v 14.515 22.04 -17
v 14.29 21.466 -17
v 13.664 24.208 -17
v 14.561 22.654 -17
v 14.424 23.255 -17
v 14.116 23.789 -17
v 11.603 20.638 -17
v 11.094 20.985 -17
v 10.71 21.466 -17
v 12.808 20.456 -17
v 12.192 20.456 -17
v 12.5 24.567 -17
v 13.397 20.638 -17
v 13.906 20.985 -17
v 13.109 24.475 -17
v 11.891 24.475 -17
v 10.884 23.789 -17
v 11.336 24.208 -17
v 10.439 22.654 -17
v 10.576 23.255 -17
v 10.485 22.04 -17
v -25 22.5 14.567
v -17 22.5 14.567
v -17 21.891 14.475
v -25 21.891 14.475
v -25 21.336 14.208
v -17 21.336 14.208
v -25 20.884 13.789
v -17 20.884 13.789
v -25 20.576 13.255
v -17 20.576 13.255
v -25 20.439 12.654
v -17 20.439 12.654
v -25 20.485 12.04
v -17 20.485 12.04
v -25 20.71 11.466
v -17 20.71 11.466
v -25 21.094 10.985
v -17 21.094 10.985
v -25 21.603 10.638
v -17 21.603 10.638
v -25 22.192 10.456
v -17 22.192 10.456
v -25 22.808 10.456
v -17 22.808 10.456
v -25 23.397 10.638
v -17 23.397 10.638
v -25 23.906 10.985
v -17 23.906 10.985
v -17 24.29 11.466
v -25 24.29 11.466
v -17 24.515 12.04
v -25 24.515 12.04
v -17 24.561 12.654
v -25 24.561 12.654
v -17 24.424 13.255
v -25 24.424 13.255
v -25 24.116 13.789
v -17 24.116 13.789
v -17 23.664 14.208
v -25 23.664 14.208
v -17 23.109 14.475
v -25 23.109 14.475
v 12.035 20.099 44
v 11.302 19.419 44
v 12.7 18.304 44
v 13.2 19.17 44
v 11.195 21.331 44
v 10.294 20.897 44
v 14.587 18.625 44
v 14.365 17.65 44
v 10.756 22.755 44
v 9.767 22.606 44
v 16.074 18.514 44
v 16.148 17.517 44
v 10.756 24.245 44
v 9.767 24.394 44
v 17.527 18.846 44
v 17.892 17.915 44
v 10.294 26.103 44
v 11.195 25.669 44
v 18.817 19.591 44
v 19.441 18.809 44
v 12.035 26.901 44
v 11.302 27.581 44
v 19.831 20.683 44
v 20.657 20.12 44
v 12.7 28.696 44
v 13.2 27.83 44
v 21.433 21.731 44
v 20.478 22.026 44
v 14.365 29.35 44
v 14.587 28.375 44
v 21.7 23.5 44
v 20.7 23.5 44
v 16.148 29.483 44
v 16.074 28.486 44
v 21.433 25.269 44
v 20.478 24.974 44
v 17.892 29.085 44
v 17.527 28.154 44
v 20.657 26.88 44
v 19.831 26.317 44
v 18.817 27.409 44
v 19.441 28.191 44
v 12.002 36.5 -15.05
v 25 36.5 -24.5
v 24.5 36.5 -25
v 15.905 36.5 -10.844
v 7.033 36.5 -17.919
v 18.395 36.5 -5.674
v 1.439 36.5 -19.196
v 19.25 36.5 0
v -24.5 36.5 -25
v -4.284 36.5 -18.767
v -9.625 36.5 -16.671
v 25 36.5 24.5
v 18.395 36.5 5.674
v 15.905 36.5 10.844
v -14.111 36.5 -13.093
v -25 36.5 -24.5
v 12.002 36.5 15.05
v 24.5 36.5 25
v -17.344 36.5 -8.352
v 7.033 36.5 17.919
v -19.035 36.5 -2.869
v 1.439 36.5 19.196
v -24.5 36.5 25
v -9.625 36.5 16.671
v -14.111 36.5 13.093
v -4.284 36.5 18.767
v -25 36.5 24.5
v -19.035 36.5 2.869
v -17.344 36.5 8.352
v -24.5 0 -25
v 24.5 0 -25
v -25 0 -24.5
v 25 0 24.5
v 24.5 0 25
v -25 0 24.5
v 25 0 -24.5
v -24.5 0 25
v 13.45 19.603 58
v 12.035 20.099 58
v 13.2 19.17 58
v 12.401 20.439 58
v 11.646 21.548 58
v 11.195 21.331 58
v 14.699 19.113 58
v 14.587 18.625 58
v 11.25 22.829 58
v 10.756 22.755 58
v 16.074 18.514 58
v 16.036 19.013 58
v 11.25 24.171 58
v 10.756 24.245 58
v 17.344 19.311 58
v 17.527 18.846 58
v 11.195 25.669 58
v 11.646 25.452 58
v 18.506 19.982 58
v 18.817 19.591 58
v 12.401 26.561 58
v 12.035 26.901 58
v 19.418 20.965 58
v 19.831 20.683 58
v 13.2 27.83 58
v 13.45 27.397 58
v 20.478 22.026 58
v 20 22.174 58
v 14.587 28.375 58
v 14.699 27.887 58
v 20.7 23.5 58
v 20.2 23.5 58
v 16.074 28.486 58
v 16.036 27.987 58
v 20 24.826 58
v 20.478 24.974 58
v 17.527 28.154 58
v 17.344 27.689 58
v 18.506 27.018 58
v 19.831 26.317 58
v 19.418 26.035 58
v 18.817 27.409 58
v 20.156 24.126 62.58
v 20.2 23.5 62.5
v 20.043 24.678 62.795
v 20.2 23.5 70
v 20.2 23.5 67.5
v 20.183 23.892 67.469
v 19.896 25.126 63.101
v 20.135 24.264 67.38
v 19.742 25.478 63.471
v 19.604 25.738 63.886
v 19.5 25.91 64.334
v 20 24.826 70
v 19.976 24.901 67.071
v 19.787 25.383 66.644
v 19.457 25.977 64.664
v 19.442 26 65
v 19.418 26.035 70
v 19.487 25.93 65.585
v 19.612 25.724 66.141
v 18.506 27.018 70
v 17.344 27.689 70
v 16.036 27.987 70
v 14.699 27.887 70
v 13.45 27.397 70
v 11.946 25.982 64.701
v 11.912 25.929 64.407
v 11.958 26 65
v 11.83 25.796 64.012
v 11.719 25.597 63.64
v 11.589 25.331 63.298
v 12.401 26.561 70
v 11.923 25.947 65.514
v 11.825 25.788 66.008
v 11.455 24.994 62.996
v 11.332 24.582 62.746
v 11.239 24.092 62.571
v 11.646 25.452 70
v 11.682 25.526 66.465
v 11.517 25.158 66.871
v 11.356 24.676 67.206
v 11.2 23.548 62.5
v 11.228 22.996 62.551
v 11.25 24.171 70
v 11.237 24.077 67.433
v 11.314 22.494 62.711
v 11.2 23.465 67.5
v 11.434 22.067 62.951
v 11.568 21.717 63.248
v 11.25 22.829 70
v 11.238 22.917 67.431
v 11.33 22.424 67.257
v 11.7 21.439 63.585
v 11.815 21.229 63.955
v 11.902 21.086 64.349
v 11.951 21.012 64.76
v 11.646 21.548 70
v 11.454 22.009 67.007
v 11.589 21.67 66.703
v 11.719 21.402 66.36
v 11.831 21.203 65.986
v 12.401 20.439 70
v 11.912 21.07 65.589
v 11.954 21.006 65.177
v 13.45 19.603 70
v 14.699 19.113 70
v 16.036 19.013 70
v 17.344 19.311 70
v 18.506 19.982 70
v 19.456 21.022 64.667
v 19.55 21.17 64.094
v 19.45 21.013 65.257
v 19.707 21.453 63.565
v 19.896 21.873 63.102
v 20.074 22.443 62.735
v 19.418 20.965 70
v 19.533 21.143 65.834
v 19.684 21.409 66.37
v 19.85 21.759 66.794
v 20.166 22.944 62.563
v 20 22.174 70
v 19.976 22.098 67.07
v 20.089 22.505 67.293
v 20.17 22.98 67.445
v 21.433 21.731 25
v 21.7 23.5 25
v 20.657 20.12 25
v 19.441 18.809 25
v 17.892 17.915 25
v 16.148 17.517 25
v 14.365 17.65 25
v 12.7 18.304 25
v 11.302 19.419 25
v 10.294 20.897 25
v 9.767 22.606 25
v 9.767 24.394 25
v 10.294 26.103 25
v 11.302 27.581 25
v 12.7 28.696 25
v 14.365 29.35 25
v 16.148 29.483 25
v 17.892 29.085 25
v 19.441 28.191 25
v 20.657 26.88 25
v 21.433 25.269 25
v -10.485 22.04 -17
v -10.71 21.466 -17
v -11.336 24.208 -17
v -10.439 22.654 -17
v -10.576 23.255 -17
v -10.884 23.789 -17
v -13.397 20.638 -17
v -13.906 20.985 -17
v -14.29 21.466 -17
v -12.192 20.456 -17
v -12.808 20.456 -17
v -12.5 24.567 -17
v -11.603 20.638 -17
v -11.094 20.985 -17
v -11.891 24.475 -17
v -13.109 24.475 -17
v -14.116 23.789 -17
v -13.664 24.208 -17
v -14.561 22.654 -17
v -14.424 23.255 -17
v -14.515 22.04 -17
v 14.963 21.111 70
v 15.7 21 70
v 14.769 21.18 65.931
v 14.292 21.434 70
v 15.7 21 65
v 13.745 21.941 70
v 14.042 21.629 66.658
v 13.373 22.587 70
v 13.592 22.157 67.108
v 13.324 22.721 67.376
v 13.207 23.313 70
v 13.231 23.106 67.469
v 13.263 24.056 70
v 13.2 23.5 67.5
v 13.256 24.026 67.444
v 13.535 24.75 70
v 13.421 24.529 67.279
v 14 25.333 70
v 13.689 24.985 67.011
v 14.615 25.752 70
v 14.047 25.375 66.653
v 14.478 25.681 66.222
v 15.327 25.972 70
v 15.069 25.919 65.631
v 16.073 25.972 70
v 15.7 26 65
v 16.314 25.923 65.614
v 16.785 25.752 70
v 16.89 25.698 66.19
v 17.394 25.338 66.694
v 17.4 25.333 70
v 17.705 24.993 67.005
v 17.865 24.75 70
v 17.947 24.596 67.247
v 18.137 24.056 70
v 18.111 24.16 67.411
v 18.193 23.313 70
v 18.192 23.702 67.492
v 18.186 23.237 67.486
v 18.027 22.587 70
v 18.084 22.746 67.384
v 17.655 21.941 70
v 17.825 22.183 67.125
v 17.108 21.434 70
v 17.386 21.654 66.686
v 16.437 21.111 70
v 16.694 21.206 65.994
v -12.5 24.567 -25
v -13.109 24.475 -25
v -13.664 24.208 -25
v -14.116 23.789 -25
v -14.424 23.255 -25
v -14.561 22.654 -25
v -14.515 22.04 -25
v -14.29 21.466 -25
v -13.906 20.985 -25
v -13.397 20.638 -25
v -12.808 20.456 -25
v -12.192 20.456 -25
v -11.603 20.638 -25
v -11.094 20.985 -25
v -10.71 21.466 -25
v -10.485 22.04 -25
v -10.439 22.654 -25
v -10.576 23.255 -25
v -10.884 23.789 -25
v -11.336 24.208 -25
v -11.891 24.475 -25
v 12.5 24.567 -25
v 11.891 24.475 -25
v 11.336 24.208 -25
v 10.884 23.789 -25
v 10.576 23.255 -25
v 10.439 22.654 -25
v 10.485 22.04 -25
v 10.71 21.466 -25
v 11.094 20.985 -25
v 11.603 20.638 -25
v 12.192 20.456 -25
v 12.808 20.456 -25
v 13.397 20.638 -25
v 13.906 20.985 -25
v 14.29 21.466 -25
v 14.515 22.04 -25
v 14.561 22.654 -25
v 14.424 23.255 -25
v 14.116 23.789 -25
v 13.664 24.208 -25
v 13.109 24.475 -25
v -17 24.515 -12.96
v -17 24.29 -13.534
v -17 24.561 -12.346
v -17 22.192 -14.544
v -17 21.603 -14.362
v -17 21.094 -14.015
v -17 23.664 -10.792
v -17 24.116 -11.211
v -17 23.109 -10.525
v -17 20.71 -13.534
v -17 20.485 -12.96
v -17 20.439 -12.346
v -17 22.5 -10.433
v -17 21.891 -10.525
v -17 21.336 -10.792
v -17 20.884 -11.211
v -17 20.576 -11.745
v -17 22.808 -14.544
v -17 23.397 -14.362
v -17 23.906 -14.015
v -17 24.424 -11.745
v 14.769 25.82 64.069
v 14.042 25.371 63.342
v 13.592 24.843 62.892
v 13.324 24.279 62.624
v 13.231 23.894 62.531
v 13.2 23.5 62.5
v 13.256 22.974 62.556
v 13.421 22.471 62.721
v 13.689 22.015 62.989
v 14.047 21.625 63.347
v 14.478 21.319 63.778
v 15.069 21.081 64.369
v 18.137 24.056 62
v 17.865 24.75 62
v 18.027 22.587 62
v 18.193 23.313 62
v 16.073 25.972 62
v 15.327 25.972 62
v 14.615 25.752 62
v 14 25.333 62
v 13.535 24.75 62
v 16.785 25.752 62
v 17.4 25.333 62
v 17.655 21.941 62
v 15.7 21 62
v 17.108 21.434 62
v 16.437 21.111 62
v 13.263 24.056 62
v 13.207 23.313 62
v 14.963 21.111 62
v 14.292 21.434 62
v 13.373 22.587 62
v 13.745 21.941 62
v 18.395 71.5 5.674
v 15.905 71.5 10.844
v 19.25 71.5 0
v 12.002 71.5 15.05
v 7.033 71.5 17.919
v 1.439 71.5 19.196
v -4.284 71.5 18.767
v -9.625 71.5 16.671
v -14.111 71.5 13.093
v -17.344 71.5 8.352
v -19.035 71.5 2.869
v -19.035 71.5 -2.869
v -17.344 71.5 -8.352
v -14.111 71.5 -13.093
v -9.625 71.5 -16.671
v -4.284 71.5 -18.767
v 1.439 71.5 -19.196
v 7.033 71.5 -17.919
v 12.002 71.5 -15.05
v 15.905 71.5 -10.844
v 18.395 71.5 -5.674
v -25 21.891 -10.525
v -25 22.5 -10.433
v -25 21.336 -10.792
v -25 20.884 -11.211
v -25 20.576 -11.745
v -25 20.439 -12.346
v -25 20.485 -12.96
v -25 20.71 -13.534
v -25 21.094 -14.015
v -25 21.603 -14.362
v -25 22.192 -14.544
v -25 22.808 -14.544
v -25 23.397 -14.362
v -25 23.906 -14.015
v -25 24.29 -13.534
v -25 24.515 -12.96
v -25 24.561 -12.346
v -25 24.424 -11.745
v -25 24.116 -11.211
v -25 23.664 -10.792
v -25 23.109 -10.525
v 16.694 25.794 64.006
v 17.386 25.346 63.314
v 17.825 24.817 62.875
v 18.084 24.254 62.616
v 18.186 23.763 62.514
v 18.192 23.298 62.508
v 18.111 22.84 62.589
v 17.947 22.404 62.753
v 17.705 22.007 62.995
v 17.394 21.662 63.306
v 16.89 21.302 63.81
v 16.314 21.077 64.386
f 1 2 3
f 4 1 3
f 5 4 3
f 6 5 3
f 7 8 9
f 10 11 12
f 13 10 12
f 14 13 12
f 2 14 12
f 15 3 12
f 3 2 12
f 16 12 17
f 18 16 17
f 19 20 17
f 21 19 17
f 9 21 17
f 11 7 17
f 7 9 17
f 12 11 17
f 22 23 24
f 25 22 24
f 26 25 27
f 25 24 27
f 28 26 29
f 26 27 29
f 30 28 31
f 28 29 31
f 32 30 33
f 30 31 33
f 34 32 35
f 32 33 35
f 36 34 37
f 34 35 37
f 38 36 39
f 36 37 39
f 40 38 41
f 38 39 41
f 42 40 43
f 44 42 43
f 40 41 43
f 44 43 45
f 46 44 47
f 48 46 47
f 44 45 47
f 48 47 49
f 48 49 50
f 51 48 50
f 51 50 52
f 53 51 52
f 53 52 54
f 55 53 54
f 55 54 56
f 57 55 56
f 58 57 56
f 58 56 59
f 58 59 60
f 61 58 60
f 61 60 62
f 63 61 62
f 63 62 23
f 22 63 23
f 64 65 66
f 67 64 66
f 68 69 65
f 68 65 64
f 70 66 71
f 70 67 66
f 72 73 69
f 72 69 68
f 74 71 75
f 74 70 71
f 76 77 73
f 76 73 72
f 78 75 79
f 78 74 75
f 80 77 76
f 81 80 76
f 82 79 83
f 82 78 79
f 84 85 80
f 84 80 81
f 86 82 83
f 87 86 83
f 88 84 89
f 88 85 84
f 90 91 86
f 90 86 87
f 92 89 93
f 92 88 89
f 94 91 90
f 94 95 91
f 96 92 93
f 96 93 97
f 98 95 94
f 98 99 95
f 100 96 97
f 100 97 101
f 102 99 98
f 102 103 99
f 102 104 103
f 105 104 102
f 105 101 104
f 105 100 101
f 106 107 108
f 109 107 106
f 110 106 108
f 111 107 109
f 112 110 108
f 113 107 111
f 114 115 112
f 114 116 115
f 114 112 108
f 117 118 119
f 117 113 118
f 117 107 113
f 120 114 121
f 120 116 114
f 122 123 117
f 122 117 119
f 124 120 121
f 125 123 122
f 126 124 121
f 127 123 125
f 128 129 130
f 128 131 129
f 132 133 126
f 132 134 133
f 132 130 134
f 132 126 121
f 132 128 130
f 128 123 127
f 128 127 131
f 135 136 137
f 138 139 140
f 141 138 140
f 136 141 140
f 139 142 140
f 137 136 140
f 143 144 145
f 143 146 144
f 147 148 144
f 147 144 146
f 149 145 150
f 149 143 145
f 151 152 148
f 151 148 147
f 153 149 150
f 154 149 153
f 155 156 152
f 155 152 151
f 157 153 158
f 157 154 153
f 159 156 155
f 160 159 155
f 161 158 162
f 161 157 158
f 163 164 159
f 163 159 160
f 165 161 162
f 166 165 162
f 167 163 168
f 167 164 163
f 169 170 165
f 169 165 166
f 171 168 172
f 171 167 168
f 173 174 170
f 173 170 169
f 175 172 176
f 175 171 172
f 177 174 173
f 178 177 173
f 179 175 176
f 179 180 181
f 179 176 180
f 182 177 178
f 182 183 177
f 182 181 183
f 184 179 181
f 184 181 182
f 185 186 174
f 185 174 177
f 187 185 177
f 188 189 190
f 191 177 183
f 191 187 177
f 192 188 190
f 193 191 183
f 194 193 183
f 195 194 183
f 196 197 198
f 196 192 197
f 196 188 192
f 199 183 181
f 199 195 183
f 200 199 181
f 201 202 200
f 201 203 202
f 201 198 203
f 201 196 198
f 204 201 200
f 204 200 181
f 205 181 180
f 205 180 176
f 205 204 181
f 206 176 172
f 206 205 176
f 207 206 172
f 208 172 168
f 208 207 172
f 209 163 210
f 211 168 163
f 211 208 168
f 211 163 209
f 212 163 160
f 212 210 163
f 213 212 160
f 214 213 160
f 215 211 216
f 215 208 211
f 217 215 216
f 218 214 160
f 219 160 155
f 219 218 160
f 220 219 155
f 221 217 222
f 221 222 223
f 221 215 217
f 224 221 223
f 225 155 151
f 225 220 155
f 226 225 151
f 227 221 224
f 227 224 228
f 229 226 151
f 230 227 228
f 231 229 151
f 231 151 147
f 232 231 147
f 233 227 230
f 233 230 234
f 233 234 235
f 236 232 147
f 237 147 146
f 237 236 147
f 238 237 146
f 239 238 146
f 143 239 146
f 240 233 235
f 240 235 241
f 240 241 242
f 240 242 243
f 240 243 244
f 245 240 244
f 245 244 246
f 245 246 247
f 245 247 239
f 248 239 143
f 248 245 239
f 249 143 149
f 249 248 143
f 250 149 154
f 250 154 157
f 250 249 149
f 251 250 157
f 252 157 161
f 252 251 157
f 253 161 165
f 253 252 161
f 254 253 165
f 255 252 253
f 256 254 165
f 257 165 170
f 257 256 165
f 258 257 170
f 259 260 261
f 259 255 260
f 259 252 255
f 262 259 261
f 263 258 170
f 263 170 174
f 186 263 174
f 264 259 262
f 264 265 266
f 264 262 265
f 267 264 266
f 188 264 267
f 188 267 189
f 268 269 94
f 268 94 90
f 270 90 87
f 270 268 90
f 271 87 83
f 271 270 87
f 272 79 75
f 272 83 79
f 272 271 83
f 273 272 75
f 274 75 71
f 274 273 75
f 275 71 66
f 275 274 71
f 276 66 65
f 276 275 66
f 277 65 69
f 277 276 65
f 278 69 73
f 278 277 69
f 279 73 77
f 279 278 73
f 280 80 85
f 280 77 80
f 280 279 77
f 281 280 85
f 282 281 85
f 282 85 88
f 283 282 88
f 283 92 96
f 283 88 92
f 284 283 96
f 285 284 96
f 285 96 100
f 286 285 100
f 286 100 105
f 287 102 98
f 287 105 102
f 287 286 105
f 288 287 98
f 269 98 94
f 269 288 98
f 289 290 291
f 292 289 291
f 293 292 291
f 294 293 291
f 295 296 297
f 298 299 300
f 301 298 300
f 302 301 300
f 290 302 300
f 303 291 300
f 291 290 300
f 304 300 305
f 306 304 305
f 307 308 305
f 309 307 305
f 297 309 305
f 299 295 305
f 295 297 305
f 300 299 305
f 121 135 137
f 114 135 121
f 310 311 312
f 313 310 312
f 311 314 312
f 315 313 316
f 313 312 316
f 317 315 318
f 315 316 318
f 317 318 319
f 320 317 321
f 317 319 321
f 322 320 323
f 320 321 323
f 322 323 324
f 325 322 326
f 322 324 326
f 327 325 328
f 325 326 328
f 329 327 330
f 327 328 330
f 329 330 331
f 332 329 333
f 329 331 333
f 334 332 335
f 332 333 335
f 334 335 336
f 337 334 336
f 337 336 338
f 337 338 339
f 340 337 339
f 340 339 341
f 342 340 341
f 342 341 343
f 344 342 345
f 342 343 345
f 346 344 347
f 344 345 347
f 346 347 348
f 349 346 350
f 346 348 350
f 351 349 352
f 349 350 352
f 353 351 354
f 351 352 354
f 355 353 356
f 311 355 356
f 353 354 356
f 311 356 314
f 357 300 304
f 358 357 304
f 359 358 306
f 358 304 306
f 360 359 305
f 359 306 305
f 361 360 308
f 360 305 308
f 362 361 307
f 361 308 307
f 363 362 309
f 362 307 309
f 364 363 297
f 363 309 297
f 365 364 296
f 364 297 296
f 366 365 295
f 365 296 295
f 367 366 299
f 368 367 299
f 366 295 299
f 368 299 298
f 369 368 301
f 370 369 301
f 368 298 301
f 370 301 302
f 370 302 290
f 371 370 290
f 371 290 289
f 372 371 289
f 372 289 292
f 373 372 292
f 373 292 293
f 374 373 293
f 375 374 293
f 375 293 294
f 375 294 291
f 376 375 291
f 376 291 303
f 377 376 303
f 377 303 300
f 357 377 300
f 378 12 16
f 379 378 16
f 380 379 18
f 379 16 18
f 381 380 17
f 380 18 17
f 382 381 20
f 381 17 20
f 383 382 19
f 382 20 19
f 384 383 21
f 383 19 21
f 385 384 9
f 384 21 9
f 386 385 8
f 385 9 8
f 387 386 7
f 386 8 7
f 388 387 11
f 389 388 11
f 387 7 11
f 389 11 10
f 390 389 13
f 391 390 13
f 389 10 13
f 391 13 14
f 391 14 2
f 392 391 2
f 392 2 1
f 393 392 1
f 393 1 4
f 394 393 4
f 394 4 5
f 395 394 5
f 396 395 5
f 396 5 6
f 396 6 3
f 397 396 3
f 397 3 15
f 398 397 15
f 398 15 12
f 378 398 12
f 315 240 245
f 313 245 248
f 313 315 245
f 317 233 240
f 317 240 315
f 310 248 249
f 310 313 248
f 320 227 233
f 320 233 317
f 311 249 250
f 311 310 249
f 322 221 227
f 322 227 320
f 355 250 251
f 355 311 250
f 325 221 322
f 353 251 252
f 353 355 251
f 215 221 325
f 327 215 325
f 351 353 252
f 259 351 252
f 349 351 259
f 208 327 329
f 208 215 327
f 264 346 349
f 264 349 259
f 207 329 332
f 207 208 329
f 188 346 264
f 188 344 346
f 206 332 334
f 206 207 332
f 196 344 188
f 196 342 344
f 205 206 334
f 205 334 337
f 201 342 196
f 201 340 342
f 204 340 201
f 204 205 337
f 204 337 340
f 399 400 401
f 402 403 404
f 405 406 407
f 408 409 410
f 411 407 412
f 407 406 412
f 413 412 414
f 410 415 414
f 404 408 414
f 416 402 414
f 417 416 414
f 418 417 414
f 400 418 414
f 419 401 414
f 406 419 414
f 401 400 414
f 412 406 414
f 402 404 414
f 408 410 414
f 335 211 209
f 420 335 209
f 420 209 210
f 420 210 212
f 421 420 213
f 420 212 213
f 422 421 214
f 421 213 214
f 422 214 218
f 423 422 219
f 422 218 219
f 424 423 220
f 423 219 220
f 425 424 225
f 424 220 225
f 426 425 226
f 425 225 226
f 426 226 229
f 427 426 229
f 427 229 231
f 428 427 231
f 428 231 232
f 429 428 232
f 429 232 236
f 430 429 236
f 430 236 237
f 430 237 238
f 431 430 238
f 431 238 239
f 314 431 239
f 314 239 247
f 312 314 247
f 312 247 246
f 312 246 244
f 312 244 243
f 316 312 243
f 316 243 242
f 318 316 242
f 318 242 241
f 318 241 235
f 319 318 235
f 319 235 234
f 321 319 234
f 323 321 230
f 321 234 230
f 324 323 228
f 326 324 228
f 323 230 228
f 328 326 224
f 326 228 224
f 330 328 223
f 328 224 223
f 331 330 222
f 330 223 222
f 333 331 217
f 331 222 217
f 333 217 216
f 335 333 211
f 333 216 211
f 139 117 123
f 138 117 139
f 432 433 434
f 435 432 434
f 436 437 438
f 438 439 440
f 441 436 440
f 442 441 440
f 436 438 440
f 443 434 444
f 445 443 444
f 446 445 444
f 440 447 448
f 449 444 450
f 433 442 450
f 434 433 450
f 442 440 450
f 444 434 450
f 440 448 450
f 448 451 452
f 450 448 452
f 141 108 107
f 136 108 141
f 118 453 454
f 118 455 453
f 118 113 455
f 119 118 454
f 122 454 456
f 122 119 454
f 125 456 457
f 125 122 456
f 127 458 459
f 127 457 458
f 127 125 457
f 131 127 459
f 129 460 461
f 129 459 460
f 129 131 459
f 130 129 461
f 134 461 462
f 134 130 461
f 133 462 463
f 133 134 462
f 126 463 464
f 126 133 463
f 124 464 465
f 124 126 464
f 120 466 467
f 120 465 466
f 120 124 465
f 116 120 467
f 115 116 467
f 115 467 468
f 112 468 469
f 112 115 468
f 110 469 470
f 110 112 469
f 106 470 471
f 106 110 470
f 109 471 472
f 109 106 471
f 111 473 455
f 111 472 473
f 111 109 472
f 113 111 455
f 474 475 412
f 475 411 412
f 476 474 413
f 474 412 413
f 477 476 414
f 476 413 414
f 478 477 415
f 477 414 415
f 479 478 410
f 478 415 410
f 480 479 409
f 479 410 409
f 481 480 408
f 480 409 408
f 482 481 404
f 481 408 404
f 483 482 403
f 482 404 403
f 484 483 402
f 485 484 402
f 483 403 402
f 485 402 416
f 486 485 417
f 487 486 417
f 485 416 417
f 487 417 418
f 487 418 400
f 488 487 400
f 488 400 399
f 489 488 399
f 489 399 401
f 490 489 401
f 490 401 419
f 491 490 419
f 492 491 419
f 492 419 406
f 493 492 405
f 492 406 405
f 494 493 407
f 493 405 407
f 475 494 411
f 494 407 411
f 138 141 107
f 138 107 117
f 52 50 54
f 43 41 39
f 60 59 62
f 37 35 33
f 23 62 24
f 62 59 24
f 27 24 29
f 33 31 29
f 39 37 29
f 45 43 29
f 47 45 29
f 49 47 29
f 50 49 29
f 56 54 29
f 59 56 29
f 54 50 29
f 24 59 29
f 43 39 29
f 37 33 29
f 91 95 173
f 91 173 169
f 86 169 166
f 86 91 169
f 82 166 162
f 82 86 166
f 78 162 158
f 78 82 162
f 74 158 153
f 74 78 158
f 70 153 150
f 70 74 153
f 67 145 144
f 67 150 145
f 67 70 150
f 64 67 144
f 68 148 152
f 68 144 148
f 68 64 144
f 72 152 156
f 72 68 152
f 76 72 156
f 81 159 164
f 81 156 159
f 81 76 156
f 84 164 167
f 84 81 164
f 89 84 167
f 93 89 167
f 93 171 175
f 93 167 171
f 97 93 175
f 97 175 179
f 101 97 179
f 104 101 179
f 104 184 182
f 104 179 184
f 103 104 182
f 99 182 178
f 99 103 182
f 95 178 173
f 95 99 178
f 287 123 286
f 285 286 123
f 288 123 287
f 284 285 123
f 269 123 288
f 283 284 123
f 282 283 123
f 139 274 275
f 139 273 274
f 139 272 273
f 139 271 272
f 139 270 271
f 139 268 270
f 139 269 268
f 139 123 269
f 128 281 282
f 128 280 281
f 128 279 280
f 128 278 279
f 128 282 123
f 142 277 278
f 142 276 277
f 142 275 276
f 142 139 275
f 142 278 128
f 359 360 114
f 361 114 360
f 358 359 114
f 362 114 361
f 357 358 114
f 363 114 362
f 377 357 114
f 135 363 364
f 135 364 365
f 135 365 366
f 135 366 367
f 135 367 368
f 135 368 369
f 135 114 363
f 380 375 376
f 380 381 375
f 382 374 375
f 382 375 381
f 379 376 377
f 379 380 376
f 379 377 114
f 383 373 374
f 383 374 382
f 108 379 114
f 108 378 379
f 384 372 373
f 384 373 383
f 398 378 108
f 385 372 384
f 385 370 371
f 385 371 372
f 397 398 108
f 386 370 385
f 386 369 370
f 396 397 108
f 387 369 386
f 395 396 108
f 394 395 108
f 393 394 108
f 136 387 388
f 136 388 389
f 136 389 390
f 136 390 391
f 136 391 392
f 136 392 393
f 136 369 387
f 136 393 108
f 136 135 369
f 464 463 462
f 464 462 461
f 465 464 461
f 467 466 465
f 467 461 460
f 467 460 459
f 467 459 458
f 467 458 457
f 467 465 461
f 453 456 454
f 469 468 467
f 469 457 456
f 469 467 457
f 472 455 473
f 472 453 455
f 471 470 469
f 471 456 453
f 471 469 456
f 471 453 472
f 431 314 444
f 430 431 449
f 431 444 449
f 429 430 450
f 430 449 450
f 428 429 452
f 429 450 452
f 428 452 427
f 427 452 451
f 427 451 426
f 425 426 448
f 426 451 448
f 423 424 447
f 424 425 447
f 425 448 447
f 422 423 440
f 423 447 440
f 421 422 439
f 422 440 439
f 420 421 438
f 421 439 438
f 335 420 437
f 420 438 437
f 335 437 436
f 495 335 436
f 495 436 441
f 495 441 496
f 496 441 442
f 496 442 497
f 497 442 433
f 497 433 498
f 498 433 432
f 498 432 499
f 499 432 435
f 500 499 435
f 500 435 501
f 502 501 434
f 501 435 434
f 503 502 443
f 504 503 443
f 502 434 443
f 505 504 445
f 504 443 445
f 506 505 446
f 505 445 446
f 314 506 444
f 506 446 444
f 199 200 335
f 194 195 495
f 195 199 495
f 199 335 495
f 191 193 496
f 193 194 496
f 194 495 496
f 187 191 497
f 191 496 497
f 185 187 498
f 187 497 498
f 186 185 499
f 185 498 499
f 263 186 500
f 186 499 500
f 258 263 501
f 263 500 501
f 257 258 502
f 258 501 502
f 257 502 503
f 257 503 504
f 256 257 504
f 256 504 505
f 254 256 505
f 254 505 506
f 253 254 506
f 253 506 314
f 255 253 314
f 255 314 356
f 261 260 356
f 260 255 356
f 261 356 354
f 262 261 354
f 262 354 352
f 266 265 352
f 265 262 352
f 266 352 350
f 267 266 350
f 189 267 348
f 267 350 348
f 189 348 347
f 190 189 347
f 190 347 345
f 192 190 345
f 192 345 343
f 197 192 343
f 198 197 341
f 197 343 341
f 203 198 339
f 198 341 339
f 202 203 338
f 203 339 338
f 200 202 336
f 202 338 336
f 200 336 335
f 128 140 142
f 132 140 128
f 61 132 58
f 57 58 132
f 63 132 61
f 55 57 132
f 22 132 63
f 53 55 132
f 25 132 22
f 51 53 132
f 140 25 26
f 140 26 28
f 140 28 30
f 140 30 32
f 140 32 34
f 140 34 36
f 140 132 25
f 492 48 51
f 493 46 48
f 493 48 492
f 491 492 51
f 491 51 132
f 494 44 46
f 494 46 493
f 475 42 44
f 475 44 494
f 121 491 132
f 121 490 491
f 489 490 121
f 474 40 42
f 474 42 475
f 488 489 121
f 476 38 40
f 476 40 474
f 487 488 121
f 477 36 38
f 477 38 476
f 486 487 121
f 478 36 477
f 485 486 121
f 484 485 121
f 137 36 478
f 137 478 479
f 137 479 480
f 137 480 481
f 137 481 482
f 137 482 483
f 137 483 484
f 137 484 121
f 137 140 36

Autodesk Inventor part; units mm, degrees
ref_plane "YZ Plane" through (0, 0, 0) normal (1, 0, 0) x (0, 1, 0)
ref_plane "XZ Plane" through (0, 0, 0) normal (0, 1, 0) x (-1, 0, 0)
ref_plane "XY Plane" through (0, 0, 0) normal (0, 0, 1) x (1, 0, 0)
sketch "Sketch1" plane through (0, 0, 0) normal (0, 1, 0) x (-1, 0, 0)
  line L0 (-25, 25) -> (25, 25)
  line L1 (25, 25) -> (25, -25)
  line L2 (25, -25) -> (-25, -25)
  line L3 (-25, -25) -> (-25, 25)
  line L4 (-25, 25) -> (25, -25) construction
  line L5 (25, 25) -> (-25, -25) construction
  point P0 (0, 0)
  dimension "d0" = 50
  dimension "d1" = 50
extrude "Extrusion1" add sketch "Sketch1" along normal blind 36.5
sketch "Sketch2" plane through (-25, 0, 25) normal (0, 0, 1) x (1, 0, 0)
  line L0 (0, 0) -> (50, 0) projected
  line L1 (50, 0) -> (50, 36.5) projected
  line L2 (0, 36.5) -> (50, 36.5) projected
  line L3 (0, 0) -> (0, 36.5) projected
  circle A0 centre (40.7, 23.5) radius 6
  line L4 (25, 0) -> (25, 36.5) construction
  dimension "d4" = 15.7
  dimension "d5" = 13
  dimension "d6" = 12
extrude "Extrusion2" add sketch "Sketch2" along normal blind 19 contours A0
sketch "Sketch3" plane through (15.7, 23.5, 44) normal (0, 0, 1) x (1, 0, 0)
  circle A0 centre (0, 0) radius 6 projected
  circle A1 centre (0, 0) radius 5
  point P0 (-15.7, -23.5)
  dimension "d9" = 10
extrude "Extrusion3" add sketch "Sketch3" along normal blind 26 contours A1
sketch "Sketch4" plane through (0, 36.5, 0) normal (0, 1, 0) x (1, 0, 0)
  circle A0 centre (0, 0) radius 19.25
  dimension "d12" = 38.5
extrude "Extrusion4" add sketch "Sketch4" along normal blind 35
sketch "Sketch5" plane through (15.7, 23.5, 70) normal (0, 0, 1) x (1, 0, 0)
  circle A0 centre (0, 0) radius 5 projected
  circle A1 centre (0, 0) radius 4.5
  point P0 (-15.7, -23.5)
  dimension "d15" = 9
extrude "Extrusion5" cut sketch "Sketch5" against normal blind 12
sketch "Sketch6" plane through (0, 0, 0) normal (1, 0, 0) x (0, 1, 0)
  line L0 (28, 58) -> (19, 58) projected
  line L1 (28, 70) -> (19, 70) projected
  circle A0 centre (23.5, 65) radius 2.5
  point P0 (0, 0)
  point P1 (23.5, 70)
  dimension "d18" = 5
  dimension "d19" = 5
extrude "Extrusion6" cut sketch "Sketch6" along normal through all
sketch "Sketch7" plane through (25, 0, -25) normal (0, 0, -1) x (-1, 0, 0)
  line L0 (0, 0) -> (50, 0) projected
  line L1 (50, 0) -> (50, 36.5) projected
  line L2 (0, 36.5) -> (50, 36.5) projected
  line L3 (0, 0) -> (0, 36.5) projected
  line L4 (12.5, 22.5) -> (37.5, 22.5) construction
  point P0 (25, 0)
  point P1 (25, 22.5)
  point P2 (25, 0)
  dimension "d22" = 25
  dimension "d23" = 22.5
sketch "Sketch8" plane through (15.7, 23.5, 70) normal (0, 0, 1) x (1, 0, 0)
  circle A0 centre (0, 0) radius 4.5 projected
  point P0 (-15.7, -23.5)
hole "Hole1" at (15.7, 23.5, 70) direction (0, 0, -1) diameter 5 depth 8
hole "Hole2" at (12.5, 22.5, -25) at (-12.5, 22.5, -25) direction (0, 0, 1) diameter 4.134 depth 8 thread size "M5x0.8" class "6H" standard "ISO Metric profile"
sketch "Sketch9" plane through (-25, 0, -25) normal (-1, 0, 0) x (0, 0, 1)
  line L0 (0, 0) -> (50, 0) projected
  line L1 (50, 0) -> (50, 36.5) projected
  line L2 (0, 36.5) -> (50, 36.5) projected
  line L3 (0, 0) -> (0, 36.5) projected
  line L4 (12.5, 22.5) -> (37.5, 22.5) construction
  point P0 (25, 0)
  point P1 (25, 22.5)
  point P2 (25, 0)
  dimension "d38" = 25
  dimension "d39" = 22.5
hole "Hole3" at (-25, 22.5, -12.5) at (-25, 22.5, 12.5) direction (1, 0, 0) diameter 4.134 depth 8 thread size "M5x0.8" class "6H" standard "ISO Metric profile"
chamfer "Chamfer1" distance 0.5 angle 45 4 edges at (25, 18.25, 25) (-25, 18.25, 25) (25, 18.25, -25) (-25, 18.25, -25)
properties part number "RE38S-600Z-1M" material "ABS Plastic"
